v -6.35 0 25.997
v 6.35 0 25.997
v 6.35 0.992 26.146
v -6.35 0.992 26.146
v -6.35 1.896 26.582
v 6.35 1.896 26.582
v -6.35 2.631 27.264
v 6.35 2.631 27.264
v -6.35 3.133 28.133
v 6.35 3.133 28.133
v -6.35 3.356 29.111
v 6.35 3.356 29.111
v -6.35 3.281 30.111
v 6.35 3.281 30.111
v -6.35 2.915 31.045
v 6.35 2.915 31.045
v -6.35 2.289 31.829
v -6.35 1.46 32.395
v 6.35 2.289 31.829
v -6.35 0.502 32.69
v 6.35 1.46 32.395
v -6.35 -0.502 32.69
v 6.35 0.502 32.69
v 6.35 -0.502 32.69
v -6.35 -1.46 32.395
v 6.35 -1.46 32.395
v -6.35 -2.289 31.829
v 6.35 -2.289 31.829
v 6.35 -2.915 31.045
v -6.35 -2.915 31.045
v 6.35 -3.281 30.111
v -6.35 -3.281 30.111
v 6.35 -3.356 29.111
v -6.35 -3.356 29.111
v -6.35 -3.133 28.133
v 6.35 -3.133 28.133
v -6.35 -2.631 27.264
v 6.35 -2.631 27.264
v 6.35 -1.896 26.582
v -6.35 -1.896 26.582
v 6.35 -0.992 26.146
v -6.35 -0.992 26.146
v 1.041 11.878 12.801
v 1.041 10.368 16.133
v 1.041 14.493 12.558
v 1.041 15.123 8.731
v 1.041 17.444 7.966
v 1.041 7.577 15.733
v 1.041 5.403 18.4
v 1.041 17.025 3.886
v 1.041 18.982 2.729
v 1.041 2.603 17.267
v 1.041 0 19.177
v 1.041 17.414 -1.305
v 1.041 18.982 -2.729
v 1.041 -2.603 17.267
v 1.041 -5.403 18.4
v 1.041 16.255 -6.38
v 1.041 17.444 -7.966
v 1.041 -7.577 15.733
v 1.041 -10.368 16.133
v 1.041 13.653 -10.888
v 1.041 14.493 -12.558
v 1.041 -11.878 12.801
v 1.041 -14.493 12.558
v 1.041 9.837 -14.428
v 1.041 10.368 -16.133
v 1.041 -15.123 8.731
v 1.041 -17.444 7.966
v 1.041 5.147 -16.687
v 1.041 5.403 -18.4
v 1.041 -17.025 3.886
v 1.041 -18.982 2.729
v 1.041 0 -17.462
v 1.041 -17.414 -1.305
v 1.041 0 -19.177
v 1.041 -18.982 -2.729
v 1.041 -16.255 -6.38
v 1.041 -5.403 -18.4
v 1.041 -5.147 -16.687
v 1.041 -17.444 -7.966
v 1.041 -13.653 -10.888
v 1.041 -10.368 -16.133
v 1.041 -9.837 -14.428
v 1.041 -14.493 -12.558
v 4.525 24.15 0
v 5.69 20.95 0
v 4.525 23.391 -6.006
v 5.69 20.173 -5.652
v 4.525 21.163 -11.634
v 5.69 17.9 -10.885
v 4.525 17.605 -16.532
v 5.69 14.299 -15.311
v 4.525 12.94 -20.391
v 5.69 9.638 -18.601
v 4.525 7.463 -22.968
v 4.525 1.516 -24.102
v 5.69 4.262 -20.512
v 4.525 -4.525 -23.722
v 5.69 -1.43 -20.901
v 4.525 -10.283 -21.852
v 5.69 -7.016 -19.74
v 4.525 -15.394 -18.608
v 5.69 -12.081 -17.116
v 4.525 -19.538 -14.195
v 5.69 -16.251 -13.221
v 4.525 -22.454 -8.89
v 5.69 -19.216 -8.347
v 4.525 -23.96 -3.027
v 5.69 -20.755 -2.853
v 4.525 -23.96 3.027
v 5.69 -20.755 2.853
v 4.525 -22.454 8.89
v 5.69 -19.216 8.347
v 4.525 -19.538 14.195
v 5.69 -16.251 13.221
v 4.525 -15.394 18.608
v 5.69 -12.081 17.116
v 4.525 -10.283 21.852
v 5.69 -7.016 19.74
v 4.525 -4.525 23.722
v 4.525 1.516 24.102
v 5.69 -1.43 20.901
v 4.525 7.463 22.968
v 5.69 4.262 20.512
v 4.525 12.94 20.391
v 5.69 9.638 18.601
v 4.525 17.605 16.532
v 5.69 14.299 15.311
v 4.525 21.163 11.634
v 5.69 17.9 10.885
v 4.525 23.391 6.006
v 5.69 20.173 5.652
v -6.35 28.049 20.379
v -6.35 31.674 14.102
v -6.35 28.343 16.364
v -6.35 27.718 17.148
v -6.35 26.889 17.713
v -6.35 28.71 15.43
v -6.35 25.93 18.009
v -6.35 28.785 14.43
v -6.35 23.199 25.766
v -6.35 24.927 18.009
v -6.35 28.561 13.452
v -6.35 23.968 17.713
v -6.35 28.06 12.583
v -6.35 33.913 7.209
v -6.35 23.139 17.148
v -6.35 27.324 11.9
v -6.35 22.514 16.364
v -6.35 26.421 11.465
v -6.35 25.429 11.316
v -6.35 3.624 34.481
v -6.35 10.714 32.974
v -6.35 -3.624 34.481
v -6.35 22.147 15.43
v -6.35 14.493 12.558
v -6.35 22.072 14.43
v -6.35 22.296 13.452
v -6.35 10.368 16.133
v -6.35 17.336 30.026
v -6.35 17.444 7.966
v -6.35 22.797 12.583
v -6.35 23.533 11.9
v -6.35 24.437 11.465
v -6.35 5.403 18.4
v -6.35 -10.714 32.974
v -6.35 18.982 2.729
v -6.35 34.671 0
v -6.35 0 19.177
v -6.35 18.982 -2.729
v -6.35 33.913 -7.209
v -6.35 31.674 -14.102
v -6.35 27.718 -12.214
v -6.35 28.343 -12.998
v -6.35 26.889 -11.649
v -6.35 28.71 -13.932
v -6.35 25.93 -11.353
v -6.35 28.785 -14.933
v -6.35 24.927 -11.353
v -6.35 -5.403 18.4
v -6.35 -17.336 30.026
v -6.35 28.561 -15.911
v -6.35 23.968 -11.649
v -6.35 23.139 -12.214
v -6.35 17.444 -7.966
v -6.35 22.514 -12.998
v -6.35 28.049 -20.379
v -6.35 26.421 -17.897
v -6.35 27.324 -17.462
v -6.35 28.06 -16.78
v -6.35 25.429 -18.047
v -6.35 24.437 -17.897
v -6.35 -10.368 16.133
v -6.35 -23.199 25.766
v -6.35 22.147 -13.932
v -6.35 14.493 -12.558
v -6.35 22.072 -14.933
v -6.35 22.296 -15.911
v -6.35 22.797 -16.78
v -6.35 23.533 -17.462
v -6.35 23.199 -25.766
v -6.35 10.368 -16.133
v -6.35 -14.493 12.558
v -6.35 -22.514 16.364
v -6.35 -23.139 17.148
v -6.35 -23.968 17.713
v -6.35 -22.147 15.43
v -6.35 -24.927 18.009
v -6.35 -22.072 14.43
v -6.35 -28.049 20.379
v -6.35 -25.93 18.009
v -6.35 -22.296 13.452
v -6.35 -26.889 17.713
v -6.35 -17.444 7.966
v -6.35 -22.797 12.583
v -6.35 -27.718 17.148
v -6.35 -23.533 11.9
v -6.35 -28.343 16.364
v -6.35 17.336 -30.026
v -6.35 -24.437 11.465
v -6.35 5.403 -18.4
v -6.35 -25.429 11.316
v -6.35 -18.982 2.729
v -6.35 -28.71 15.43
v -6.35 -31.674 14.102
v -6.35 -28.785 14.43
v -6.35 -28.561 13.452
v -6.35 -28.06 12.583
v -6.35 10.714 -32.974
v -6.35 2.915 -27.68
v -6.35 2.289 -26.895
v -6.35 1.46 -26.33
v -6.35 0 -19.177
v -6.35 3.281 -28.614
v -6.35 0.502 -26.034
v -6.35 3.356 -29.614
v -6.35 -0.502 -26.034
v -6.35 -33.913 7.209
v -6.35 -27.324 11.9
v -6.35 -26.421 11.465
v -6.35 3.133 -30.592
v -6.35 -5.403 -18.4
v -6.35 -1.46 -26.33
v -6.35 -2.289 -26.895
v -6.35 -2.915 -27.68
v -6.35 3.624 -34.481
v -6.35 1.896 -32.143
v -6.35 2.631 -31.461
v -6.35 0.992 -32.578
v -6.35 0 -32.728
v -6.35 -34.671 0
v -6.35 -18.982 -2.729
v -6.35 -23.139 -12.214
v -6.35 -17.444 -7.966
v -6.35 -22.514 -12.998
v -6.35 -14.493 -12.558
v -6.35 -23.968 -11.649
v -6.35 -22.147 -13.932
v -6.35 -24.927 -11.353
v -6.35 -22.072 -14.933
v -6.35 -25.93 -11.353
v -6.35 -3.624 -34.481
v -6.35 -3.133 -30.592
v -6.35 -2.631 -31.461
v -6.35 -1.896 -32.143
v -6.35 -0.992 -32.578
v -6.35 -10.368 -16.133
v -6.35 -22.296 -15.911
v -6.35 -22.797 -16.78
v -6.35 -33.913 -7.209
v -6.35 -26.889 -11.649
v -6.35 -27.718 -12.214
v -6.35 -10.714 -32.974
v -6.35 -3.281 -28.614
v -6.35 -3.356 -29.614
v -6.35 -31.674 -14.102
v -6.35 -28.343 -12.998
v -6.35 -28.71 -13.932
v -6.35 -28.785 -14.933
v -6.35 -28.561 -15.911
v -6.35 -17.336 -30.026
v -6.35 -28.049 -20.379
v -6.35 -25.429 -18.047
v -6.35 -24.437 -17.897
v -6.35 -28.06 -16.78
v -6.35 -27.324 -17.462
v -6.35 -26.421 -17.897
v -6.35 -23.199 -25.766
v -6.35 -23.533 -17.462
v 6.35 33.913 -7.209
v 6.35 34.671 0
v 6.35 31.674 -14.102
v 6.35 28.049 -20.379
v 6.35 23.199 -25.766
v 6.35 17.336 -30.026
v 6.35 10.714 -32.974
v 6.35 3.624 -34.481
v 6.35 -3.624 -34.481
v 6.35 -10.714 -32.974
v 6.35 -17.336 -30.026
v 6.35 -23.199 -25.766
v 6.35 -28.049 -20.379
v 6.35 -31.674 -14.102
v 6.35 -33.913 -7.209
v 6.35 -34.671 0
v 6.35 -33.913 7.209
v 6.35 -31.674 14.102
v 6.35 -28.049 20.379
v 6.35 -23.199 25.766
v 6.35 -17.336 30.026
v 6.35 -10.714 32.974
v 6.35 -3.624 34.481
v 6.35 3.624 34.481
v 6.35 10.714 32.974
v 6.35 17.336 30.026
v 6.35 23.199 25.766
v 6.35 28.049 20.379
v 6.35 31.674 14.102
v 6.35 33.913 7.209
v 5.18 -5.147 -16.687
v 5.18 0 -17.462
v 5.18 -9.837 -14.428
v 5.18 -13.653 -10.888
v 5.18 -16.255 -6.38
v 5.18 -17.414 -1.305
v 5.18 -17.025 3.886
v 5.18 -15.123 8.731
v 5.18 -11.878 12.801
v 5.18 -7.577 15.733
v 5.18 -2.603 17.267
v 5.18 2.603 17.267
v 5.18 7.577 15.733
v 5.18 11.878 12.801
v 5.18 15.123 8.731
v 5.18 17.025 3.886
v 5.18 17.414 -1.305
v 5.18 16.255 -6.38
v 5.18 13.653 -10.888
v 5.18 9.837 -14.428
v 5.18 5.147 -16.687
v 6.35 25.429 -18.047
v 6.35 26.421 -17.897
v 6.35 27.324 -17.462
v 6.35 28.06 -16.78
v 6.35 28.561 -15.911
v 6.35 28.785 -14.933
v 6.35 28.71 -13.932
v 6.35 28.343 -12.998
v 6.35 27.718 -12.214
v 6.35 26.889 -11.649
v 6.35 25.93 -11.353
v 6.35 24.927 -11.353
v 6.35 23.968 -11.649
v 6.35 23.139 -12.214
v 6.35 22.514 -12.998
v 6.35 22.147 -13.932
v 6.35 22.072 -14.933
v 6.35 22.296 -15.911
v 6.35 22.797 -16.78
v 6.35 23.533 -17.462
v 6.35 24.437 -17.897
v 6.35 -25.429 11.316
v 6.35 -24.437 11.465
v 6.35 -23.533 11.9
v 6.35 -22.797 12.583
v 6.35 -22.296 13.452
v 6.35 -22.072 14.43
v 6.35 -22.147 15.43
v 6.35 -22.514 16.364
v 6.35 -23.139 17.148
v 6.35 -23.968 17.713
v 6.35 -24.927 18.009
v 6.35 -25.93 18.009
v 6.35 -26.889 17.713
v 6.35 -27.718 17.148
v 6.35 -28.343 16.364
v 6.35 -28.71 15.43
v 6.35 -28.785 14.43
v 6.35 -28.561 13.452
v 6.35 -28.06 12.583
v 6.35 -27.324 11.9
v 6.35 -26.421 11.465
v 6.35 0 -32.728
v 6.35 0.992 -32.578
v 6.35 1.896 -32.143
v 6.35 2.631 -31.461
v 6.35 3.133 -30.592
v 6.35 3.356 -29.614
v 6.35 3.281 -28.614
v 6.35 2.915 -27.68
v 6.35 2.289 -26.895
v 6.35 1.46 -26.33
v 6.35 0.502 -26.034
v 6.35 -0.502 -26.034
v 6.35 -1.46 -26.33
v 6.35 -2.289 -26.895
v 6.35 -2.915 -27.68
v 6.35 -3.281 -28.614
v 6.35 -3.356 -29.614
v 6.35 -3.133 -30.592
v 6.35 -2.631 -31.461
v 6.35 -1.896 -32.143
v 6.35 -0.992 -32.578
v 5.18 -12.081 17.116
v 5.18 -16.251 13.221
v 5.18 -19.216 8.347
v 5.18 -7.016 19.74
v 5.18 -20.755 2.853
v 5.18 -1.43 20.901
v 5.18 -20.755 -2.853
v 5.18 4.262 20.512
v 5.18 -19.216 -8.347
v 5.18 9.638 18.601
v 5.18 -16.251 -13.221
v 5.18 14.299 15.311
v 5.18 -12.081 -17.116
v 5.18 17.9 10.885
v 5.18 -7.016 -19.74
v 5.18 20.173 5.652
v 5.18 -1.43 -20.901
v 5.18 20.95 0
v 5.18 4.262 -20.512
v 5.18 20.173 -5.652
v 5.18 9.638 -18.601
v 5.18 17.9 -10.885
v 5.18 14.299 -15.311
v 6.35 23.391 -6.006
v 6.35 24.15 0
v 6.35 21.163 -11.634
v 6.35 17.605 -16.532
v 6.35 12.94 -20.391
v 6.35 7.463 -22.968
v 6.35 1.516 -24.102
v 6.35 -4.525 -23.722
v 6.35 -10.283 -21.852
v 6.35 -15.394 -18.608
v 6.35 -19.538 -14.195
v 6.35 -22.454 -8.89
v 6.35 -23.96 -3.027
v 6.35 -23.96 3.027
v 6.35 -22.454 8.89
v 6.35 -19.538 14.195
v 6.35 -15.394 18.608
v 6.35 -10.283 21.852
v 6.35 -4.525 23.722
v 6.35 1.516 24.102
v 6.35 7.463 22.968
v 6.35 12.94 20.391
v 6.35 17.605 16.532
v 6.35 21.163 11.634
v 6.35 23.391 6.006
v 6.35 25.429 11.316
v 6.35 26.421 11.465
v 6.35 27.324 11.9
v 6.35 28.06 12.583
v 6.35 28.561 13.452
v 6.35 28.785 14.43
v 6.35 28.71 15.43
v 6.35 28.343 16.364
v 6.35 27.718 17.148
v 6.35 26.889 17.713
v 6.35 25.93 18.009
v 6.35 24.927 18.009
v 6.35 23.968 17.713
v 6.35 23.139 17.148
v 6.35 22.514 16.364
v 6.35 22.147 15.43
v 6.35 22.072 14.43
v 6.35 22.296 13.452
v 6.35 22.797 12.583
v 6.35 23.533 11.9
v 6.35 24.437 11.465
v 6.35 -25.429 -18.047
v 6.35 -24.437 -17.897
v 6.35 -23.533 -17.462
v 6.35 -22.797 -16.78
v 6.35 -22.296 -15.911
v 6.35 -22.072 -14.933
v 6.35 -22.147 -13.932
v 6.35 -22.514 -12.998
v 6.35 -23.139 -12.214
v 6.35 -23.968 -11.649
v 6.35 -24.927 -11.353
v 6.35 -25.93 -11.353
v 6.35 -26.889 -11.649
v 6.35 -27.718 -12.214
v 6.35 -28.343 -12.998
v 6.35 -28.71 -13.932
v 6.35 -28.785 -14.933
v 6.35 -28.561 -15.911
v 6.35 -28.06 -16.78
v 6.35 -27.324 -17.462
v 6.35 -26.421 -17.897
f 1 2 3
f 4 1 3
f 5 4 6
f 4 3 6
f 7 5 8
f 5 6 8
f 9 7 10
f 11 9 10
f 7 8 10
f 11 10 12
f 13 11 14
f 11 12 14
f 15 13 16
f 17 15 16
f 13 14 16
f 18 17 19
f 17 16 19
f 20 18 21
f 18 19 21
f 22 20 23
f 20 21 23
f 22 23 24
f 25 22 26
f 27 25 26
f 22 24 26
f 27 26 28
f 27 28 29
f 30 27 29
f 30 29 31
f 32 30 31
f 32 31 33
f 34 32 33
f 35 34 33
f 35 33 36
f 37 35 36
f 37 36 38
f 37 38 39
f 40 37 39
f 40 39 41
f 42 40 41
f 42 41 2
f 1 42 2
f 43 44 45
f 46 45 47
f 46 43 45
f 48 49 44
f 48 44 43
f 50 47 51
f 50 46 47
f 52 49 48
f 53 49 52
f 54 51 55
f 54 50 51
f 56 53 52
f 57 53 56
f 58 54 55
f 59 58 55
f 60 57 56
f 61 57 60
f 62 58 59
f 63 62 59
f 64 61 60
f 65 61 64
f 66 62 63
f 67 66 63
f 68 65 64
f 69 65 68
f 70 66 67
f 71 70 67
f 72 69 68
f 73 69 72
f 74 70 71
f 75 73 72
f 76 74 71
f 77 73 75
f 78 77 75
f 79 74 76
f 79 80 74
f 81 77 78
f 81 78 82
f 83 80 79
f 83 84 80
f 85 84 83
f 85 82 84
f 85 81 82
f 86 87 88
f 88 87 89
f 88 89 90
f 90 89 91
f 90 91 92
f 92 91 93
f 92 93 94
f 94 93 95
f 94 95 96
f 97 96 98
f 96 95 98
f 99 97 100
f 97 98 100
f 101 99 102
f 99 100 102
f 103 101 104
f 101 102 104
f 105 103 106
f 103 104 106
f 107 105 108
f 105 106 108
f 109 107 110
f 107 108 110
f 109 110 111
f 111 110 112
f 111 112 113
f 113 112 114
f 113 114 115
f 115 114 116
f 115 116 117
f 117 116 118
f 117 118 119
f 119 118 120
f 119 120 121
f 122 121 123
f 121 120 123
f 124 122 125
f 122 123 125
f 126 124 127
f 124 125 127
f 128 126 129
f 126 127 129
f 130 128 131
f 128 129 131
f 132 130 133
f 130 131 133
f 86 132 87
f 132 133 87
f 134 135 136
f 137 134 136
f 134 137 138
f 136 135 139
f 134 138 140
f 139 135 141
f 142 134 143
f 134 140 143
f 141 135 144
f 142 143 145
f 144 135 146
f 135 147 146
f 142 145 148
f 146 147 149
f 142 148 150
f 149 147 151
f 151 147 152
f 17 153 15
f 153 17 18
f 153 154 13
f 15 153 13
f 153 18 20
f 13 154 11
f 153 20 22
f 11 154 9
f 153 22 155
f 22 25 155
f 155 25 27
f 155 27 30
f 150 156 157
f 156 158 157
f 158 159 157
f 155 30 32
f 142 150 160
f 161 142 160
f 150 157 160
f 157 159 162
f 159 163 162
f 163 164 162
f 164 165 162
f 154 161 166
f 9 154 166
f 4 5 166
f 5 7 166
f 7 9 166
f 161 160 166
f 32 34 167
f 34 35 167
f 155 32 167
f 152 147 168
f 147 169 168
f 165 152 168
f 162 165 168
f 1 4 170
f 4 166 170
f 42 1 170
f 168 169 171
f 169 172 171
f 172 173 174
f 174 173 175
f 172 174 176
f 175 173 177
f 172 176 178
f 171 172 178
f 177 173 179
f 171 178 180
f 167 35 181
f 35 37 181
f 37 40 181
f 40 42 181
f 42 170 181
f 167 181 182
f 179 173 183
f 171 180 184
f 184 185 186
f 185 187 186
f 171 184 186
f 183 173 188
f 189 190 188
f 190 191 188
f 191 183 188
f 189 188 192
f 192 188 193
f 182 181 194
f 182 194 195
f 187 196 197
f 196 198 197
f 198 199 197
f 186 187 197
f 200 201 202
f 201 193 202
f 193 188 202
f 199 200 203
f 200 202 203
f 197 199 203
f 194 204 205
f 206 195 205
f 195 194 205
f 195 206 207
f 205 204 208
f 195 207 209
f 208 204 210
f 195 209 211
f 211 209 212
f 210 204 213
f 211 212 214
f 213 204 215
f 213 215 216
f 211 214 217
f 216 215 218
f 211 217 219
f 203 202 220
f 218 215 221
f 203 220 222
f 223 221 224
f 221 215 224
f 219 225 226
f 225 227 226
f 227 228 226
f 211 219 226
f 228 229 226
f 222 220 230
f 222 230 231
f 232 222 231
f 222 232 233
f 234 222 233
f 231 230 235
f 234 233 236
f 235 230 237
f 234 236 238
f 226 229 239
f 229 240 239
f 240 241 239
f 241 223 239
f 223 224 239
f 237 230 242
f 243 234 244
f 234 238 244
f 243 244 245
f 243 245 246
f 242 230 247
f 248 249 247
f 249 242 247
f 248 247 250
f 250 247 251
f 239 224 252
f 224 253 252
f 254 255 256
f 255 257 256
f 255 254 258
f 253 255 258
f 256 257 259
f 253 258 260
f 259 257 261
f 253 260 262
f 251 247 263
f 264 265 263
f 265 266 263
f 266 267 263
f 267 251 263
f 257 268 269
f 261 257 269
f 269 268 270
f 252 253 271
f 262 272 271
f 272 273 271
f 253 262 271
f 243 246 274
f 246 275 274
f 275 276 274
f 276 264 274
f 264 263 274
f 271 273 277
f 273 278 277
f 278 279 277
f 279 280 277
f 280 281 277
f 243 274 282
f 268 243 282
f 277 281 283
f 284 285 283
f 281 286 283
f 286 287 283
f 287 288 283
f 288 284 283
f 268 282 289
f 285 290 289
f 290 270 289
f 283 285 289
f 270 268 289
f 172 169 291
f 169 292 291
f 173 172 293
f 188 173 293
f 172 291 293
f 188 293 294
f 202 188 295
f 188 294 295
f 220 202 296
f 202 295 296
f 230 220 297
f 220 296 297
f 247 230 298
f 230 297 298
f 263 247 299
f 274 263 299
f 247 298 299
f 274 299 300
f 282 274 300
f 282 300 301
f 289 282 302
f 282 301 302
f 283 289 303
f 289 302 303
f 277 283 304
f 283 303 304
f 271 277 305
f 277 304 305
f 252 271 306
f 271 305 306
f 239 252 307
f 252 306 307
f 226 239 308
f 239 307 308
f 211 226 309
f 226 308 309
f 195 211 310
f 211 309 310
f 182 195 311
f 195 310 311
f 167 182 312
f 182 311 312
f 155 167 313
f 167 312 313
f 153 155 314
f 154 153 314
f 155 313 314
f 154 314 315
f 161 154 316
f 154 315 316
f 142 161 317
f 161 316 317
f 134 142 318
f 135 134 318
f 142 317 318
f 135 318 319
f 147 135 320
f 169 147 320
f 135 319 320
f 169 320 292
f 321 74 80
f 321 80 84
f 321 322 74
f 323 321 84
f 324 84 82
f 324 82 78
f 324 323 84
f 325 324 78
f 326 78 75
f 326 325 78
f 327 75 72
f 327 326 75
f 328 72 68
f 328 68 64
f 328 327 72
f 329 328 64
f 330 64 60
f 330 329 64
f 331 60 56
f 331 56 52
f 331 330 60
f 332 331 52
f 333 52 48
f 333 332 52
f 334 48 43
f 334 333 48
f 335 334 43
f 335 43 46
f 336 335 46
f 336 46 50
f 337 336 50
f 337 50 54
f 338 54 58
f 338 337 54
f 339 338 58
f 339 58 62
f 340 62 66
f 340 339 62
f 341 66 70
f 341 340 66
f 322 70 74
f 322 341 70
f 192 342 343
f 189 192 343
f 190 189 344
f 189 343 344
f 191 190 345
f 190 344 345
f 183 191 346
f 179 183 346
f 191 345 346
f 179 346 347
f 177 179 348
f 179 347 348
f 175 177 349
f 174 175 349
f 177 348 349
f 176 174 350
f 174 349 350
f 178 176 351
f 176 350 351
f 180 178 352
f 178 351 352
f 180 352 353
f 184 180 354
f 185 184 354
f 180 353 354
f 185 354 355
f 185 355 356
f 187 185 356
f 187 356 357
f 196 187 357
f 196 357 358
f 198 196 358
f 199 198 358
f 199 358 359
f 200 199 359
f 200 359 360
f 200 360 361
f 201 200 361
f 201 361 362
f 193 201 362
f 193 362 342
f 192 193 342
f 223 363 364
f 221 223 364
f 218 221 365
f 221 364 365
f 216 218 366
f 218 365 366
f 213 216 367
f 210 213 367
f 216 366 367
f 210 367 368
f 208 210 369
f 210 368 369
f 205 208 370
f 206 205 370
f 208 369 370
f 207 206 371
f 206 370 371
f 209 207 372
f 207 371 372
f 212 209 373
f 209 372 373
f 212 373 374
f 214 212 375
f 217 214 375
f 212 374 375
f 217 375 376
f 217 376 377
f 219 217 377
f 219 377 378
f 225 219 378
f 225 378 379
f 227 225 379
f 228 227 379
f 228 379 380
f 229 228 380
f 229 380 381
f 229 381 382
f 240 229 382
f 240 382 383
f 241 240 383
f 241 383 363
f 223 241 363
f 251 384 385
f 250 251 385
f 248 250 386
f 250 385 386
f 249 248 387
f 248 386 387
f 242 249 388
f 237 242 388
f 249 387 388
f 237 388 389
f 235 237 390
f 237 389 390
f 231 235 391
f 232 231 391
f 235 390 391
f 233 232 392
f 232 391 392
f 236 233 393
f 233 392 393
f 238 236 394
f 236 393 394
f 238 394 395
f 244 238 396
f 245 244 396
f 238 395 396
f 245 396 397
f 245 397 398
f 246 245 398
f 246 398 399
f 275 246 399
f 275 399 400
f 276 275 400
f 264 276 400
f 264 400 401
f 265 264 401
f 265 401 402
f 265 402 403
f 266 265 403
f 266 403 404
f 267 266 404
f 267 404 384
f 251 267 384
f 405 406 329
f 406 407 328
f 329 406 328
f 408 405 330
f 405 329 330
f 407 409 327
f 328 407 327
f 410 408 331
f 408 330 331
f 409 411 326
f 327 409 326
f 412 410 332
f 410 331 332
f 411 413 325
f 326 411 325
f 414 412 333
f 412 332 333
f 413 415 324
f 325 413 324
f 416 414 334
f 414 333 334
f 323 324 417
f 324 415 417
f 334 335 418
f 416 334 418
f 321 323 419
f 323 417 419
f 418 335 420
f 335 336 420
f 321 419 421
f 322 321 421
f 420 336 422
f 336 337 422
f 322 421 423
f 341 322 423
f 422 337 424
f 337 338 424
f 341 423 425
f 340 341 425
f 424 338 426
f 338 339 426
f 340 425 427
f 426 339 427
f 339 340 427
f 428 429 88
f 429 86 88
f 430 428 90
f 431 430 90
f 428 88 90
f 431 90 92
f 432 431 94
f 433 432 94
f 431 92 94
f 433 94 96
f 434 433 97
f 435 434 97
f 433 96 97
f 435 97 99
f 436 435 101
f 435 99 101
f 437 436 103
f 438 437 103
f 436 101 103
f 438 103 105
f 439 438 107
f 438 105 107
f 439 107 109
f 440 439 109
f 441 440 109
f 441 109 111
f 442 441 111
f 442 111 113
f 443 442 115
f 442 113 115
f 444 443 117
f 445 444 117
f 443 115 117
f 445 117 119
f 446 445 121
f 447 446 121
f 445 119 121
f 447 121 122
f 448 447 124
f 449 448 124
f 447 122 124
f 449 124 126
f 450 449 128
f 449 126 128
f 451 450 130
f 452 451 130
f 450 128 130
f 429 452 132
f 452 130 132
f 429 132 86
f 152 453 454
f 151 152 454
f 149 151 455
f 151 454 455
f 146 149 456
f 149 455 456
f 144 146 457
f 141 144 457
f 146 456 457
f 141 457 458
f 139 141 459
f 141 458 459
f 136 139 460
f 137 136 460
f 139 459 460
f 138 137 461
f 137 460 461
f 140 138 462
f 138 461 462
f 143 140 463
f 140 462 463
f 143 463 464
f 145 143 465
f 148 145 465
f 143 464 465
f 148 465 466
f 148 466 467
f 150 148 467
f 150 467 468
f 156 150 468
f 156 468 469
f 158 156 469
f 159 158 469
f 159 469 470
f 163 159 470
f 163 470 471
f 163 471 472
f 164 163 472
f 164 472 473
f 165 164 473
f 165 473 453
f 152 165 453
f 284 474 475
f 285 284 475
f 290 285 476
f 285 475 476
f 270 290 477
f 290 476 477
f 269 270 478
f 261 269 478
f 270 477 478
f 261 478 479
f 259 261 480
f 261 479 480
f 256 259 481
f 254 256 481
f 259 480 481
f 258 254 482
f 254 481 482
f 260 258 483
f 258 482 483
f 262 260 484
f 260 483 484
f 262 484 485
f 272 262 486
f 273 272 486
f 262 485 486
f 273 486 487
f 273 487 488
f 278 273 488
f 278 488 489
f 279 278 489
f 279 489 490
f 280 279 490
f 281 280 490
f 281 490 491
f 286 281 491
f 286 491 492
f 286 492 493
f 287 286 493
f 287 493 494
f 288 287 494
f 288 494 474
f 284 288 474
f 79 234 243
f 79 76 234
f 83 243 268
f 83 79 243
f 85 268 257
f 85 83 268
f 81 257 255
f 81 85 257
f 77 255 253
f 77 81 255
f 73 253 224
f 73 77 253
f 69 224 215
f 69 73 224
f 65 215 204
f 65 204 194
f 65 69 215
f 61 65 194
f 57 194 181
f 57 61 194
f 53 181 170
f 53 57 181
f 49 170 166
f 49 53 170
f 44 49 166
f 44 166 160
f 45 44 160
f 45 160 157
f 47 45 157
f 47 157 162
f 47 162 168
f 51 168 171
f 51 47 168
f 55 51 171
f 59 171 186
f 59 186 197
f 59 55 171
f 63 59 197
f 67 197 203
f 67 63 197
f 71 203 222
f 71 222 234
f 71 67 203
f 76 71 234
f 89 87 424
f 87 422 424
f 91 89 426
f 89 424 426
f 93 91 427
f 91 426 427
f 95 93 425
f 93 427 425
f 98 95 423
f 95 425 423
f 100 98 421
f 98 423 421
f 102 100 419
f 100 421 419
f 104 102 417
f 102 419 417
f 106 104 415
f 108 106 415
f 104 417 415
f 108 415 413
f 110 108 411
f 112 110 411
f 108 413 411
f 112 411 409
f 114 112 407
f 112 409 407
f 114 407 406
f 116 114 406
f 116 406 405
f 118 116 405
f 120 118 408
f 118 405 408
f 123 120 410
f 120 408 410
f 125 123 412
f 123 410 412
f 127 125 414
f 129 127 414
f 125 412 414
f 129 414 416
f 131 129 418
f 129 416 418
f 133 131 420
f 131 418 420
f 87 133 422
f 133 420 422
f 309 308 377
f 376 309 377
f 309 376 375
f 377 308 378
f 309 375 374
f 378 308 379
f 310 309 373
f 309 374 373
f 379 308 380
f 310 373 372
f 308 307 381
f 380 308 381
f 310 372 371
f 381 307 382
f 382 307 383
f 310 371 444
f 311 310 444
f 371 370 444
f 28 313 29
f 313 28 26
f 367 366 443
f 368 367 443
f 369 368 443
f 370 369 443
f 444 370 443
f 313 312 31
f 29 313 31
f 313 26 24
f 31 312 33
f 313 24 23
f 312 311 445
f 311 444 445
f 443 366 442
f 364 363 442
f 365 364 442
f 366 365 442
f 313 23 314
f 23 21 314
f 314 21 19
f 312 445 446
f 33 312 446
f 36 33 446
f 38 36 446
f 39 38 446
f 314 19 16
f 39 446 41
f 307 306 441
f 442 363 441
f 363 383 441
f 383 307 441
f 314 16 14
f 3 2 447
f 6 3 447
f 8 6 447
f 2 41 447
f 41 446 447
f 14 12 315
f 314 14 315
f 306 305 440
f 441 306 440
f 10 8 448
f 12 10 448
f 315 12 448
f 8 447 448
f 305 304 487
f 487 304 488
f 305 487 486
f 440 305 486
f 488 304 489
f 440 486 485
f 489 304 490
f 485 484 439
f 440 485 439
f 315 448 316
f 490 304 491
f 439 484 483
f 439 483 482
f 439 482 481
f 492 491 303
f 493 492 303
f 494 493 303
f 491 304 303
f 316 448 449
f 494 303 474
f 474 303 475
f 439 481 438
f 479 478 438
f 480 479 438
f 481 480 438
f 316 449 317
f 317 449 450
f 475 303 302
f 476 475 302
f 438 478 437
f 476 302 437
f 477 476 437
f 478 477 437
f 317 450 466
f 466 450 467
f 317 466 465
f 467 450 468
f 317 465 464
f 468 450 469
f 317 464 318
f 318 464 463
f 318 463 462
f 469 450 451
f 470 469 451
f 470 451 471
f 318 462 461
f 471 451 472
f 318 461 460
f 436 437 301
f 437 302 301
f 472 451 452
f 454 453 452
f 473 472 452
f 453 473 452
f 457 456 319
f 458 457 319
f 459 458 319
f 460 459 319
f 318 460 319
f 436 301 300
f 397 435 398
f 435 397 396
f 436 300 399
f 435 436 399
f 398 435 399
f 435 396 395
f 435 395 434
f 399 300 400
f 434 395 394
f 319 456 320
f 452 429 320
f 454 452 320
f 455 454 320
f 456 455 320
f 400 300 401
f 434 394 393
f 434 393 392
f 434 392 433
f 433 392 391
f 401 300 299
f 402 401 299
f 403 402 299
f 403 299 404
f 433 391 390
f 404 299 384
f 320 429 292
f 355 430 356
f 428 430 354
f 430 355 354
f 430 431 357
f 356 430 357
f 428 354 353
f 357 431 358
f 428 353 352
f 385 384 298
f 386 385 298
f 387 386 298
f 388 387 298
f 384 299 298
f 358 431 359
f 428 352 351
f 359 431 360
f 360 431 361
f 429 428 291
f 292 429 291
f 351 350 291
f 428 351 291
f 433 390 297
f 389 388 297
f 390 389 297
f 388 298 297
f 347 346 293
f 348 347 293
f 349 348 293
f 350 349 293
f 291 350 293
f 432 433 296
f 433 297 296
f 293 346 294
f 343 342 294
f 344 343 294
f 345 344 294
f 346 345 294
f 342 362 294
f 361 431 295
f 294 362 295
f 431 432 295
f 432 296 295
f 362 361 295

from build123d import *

# Parameters (mm, degrees)
F_1_4_CLEARANCE_HOLE1_D     = 6.731
F_1_4_CLEARANCE_HOLE1_DEPTH = 12.7


with BuildPart() as part:
    # Sketch1 → Revolve1 (revolve)
    with BuildSketch(Plane(origin=(0, 0, 0), x_dir=(-1, 0, 0), z_dir=(0, 0, -1))):
        Polygon((-5.18, 20.95), (-5.18, 0), (6.35, 0), (6.35, 34.671), (-6.35, 34.671), (-6.35, 24.15), (-4.525295248, 24.15), (-5.690000002, 20.95), align=None)
    revolve(axis=Axis((6.35, 0, 0), (-1, 0, 0)))

    # Sketch2 → 1-3/8-6 Tapped Hole1 (revolve, cut)
    with BuildSketch(Plane(origin=(5.18, 0, 0), x_dir=(0, 0, -1), z_dir=(0, 1, 0))):
        Polygon((0, 0), (0, 11.53), (19.177, 11.53), (19.177, 4.1386), (17.4625, 4.1386), (17.4625, 0), align=None)
    revolve(axis=Axis((11.53, 0, 0), (-1, 0, 0)), mode=Mode.SUBTRACT)

    # 1/4 Clearance Hole1
    with Locations(Plane.ZY.offset(6.35)):
        with Locations((14.6812, -25.428584316), (29.3624, 0), (14.6812, 25.428584316), (-14.6812, 25.428584316), (-14.6812, -25.428584316), (-29.3624, 0)):
            Hole(F_1_4_CLEARANCE_HOLE1_D / 2, depth=F_1_4_CLEARANCE_HOLE1_DEPTH)


solid = part.part
